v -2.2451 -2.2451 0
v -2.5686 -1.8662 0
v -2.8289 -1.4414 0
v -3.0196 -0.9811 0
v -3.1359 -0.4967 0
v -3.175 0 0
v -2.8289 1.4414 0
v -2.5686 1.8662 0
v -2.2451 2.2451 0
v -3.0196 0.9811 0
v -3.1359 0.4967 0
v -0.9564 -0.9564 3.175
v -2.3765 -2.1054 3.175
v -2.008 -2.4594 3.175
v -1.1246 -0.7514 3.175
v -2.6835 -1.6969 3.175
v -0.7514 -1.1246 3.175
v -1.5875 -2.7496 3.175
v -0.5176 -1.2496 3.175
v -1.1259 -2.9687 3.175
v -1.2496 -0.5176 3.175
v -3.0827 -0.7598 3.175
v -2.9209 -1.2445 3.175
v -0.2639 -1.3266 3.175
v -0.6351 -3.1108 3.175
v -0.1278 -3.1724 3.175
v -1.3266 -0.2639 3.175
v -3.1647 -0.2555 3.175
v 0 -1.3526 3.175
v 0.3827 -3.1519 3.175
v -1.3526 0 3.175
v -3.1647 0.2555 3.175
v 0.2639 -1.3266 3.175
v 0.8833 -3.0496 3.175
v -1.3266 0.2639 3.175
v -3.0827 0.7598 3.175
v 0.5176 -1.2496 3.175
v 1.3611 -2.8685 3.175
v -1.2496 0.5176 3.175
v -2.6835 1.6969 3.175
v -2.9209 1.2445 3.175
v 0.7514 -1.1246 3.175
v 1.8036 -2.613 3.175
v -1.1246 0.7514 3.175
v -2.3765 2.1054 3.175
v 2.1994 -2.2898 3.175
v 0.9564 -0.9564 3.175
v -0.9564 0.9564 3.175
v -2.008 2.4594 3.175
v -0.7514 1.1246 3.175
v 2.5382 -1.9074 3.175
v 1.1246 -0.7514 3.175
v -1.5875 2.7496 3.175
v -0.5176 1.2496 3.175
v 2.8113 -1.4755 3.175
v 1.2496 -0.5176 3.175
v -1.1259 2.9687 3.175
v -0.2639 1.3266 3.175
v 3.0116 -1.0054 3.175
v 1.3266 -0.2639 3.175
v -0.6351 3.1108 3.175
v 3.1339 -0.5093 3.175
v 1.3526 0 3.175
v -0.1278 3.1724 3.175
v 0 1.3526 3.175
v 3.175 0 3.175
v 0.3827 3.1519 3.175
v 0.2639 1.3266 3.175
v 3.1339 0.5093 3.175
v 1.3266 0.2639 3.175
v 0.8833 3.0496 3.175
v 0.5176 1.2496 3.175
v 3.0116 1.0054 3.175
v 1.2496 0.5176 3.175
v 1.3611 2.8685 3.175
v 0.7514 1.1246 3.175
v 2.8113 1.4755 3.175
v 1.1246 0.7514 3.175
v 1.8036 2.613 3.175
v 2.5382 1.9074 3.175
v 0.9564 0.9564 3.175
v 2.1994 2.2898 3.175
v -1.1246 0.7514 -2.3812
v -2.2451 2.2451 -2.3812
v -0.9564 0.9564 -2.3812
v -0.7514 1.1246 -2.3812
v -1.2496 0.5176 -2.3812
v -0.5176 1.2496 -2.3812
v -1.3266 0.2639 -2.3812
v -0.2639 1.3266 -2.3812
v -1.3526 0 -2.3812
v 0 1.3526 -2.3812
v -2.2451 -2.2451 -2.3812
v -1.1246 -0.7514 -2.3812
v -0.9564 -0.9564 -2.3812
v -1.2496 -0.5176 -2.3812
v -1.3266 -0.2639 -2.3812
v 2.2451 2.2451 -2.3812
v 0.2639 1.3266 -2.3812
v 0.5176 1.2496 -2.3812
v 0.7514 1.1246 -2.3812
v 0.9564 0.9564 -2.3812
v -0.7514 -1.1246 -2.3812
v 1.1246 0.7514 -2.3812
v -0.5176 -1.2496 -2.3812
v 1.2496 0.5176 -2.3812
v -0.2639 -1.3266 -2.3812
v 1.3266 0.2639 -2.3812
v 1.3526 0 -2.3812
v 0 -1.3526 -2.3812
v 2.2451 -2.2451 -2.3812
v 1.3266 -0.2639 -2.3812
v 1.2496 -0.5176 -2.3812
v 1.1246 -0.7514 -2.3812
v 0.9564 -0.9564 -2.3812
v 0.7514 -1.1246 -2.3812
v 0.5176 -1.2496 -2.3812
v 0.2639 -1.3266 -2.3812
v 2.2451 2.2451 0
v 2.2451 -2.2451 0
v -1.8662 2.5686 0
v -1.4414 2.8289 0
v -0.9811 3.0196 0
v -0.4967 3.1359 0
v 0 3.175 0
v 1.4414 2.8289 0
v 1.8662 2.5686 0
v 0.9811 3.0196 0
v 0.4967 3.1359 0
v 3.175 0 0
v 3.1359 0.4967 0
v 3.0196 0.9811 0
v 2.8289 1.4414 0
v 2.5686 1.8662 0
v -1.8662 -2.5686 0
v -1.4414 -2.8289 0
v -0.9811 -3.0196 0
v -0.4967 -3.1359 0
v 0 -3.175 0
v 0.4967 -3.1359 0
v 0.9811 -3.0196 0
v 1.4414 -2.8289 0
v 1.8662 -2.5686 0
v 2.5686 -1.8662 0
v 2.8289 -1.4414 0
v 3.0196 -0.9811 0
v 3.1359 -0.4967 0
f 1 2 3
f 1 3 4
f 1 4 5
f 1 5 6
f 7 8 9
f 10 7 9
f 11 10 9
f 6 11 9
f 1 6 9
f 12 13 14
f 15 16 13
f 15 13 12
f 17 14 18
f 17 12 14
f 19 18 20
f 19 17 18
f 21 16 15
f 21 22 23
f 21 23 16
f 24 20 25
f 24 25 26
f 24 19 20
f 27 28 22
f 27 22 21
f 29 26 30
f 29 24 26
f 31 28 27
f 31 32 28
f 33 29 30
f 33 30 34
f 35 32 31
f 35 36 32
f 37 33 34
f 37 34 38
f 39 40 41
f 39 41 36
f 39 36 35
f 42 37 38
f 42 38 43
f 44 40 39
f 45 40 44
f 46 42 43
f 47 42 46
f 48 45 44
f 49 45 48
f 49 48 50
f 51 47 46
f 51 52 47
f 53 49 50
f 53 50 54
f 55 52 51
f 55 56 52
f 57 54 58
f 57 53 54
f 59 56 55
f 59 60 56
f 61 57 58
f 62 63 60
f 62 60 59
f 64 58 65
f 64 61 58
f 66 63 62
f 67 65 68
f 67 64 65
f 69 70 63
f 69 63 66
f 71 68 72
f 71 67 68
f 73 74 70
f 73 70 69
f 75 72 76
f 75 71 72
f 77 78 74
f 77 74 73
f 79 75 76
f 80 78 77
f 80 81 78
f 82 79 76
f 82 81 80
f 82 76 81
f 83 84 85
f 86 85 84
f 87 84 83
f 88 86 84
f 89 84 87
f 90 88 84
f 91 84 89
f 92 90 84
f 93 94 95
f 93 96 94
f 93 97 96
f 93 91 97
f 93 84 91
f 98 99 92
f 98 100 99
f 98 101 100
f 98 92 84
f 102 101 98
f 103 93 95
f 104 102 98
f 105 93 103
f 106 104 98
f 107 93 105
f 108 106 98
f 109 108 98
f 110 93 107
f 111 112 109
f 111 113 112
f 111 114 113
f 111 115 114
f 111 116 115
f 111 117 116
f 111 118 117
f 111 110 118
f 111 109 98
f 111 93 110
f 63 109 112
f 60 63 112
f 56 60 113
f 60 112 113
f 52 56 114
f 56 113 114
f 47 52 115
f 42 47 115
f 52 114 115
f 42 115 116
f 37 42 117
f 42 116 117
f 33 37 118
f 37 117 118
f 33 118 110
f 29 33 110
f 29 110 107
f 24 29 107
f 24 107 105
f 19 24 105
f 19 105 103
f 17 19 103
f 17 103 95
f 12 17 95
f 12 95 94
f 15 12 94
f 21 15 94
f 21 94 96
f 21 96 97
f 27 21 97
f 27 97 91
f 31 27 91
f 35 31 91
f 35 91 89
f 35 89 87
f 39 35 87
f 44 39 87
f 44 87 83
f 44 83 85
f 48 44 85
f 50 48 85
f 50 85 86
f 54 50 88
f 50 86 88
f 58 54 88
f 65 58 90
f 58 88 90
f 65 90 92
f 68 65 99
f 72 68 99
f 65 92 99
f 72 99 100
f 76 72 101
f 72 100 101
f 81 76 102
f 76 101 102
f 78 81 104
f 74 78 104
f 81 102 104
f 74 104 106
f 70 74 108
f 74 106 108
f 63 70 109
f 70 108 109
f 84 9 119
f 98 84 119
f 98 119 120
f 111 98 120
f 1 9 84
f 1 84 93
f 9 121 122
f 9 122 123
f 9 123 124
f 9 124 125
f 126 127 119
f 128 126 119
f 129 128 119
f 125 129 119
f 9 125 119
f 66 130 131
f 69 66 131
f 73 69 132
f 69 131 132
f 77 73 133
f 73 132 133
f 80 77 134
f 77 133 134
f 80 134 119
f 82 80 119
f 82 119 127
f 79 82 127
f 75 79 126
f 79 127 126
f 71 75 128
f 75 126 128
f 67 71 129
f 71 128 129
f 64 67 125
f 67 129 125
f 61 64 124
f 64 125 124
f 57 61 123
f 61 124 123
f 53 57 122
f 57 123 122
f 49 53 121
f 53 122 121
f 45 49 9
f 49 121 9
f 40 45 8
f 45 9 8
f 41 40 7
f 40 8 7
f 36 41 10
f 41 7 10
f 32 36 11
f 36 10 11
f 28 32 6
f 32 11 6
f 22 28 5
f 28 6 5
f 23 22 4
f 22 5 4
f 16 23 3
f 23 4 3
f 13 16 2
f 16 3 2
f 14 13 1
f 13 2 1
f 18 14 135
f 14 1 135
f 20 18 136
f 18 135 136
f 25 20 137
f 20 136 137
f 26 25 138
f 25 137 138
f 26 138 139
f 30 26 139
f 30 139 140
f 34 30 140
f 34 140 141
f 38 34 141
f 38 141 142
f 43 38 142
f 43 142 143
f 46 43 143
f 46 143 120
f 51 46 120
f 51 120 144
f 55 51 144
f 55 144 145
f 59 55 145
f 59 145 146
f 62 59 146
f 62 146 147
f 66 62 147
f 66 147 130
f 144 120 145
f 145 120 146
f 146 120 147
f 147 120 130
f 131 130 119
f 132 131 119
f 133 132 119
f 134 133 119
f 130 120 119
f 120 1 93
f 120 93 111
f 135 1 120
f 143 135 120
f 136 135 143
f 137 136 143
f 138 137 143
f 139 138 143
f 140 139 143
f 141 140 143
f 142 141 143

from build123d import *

# Parameters (mm, degrees)
F0_R     = 3.175
F1_DEPTH = 3.175
F2_W     = 4.490128
F2_H     = 4.490128
F3_DEPTH = 2.38125
F4_R     = 1.35255
F5_DEPTH = 6.35


with BuildPart() as f1:
    # F0 (on Top) → F1 (new body)
    with BuildSketch(Plane.XY):
        Circle(F0_R)
    extrude(amount=F1_DEPTH)

    # F2 (on face) → F3 (join)
    with BuildSketch(Plane(origin=(0, 0, 0), x_dir=(1, 0, 0), z_dir=(0, 0, -1))):
        Rectangle(F2_W, F2_H)
    extrude(amount=F3_DEPTH)

    # F4 (on face) → F5 (cut)
    with BuildSketch(Plane(origin=(0, 0, -2.38125), x_dir=(1, 0, 0), z_dir=(0, 0, -1))):
        Circle(F4_R)
    extrude(amount=-F5_DEPTH, mode=Mode.SUBTRACT)


solid = f1.part
